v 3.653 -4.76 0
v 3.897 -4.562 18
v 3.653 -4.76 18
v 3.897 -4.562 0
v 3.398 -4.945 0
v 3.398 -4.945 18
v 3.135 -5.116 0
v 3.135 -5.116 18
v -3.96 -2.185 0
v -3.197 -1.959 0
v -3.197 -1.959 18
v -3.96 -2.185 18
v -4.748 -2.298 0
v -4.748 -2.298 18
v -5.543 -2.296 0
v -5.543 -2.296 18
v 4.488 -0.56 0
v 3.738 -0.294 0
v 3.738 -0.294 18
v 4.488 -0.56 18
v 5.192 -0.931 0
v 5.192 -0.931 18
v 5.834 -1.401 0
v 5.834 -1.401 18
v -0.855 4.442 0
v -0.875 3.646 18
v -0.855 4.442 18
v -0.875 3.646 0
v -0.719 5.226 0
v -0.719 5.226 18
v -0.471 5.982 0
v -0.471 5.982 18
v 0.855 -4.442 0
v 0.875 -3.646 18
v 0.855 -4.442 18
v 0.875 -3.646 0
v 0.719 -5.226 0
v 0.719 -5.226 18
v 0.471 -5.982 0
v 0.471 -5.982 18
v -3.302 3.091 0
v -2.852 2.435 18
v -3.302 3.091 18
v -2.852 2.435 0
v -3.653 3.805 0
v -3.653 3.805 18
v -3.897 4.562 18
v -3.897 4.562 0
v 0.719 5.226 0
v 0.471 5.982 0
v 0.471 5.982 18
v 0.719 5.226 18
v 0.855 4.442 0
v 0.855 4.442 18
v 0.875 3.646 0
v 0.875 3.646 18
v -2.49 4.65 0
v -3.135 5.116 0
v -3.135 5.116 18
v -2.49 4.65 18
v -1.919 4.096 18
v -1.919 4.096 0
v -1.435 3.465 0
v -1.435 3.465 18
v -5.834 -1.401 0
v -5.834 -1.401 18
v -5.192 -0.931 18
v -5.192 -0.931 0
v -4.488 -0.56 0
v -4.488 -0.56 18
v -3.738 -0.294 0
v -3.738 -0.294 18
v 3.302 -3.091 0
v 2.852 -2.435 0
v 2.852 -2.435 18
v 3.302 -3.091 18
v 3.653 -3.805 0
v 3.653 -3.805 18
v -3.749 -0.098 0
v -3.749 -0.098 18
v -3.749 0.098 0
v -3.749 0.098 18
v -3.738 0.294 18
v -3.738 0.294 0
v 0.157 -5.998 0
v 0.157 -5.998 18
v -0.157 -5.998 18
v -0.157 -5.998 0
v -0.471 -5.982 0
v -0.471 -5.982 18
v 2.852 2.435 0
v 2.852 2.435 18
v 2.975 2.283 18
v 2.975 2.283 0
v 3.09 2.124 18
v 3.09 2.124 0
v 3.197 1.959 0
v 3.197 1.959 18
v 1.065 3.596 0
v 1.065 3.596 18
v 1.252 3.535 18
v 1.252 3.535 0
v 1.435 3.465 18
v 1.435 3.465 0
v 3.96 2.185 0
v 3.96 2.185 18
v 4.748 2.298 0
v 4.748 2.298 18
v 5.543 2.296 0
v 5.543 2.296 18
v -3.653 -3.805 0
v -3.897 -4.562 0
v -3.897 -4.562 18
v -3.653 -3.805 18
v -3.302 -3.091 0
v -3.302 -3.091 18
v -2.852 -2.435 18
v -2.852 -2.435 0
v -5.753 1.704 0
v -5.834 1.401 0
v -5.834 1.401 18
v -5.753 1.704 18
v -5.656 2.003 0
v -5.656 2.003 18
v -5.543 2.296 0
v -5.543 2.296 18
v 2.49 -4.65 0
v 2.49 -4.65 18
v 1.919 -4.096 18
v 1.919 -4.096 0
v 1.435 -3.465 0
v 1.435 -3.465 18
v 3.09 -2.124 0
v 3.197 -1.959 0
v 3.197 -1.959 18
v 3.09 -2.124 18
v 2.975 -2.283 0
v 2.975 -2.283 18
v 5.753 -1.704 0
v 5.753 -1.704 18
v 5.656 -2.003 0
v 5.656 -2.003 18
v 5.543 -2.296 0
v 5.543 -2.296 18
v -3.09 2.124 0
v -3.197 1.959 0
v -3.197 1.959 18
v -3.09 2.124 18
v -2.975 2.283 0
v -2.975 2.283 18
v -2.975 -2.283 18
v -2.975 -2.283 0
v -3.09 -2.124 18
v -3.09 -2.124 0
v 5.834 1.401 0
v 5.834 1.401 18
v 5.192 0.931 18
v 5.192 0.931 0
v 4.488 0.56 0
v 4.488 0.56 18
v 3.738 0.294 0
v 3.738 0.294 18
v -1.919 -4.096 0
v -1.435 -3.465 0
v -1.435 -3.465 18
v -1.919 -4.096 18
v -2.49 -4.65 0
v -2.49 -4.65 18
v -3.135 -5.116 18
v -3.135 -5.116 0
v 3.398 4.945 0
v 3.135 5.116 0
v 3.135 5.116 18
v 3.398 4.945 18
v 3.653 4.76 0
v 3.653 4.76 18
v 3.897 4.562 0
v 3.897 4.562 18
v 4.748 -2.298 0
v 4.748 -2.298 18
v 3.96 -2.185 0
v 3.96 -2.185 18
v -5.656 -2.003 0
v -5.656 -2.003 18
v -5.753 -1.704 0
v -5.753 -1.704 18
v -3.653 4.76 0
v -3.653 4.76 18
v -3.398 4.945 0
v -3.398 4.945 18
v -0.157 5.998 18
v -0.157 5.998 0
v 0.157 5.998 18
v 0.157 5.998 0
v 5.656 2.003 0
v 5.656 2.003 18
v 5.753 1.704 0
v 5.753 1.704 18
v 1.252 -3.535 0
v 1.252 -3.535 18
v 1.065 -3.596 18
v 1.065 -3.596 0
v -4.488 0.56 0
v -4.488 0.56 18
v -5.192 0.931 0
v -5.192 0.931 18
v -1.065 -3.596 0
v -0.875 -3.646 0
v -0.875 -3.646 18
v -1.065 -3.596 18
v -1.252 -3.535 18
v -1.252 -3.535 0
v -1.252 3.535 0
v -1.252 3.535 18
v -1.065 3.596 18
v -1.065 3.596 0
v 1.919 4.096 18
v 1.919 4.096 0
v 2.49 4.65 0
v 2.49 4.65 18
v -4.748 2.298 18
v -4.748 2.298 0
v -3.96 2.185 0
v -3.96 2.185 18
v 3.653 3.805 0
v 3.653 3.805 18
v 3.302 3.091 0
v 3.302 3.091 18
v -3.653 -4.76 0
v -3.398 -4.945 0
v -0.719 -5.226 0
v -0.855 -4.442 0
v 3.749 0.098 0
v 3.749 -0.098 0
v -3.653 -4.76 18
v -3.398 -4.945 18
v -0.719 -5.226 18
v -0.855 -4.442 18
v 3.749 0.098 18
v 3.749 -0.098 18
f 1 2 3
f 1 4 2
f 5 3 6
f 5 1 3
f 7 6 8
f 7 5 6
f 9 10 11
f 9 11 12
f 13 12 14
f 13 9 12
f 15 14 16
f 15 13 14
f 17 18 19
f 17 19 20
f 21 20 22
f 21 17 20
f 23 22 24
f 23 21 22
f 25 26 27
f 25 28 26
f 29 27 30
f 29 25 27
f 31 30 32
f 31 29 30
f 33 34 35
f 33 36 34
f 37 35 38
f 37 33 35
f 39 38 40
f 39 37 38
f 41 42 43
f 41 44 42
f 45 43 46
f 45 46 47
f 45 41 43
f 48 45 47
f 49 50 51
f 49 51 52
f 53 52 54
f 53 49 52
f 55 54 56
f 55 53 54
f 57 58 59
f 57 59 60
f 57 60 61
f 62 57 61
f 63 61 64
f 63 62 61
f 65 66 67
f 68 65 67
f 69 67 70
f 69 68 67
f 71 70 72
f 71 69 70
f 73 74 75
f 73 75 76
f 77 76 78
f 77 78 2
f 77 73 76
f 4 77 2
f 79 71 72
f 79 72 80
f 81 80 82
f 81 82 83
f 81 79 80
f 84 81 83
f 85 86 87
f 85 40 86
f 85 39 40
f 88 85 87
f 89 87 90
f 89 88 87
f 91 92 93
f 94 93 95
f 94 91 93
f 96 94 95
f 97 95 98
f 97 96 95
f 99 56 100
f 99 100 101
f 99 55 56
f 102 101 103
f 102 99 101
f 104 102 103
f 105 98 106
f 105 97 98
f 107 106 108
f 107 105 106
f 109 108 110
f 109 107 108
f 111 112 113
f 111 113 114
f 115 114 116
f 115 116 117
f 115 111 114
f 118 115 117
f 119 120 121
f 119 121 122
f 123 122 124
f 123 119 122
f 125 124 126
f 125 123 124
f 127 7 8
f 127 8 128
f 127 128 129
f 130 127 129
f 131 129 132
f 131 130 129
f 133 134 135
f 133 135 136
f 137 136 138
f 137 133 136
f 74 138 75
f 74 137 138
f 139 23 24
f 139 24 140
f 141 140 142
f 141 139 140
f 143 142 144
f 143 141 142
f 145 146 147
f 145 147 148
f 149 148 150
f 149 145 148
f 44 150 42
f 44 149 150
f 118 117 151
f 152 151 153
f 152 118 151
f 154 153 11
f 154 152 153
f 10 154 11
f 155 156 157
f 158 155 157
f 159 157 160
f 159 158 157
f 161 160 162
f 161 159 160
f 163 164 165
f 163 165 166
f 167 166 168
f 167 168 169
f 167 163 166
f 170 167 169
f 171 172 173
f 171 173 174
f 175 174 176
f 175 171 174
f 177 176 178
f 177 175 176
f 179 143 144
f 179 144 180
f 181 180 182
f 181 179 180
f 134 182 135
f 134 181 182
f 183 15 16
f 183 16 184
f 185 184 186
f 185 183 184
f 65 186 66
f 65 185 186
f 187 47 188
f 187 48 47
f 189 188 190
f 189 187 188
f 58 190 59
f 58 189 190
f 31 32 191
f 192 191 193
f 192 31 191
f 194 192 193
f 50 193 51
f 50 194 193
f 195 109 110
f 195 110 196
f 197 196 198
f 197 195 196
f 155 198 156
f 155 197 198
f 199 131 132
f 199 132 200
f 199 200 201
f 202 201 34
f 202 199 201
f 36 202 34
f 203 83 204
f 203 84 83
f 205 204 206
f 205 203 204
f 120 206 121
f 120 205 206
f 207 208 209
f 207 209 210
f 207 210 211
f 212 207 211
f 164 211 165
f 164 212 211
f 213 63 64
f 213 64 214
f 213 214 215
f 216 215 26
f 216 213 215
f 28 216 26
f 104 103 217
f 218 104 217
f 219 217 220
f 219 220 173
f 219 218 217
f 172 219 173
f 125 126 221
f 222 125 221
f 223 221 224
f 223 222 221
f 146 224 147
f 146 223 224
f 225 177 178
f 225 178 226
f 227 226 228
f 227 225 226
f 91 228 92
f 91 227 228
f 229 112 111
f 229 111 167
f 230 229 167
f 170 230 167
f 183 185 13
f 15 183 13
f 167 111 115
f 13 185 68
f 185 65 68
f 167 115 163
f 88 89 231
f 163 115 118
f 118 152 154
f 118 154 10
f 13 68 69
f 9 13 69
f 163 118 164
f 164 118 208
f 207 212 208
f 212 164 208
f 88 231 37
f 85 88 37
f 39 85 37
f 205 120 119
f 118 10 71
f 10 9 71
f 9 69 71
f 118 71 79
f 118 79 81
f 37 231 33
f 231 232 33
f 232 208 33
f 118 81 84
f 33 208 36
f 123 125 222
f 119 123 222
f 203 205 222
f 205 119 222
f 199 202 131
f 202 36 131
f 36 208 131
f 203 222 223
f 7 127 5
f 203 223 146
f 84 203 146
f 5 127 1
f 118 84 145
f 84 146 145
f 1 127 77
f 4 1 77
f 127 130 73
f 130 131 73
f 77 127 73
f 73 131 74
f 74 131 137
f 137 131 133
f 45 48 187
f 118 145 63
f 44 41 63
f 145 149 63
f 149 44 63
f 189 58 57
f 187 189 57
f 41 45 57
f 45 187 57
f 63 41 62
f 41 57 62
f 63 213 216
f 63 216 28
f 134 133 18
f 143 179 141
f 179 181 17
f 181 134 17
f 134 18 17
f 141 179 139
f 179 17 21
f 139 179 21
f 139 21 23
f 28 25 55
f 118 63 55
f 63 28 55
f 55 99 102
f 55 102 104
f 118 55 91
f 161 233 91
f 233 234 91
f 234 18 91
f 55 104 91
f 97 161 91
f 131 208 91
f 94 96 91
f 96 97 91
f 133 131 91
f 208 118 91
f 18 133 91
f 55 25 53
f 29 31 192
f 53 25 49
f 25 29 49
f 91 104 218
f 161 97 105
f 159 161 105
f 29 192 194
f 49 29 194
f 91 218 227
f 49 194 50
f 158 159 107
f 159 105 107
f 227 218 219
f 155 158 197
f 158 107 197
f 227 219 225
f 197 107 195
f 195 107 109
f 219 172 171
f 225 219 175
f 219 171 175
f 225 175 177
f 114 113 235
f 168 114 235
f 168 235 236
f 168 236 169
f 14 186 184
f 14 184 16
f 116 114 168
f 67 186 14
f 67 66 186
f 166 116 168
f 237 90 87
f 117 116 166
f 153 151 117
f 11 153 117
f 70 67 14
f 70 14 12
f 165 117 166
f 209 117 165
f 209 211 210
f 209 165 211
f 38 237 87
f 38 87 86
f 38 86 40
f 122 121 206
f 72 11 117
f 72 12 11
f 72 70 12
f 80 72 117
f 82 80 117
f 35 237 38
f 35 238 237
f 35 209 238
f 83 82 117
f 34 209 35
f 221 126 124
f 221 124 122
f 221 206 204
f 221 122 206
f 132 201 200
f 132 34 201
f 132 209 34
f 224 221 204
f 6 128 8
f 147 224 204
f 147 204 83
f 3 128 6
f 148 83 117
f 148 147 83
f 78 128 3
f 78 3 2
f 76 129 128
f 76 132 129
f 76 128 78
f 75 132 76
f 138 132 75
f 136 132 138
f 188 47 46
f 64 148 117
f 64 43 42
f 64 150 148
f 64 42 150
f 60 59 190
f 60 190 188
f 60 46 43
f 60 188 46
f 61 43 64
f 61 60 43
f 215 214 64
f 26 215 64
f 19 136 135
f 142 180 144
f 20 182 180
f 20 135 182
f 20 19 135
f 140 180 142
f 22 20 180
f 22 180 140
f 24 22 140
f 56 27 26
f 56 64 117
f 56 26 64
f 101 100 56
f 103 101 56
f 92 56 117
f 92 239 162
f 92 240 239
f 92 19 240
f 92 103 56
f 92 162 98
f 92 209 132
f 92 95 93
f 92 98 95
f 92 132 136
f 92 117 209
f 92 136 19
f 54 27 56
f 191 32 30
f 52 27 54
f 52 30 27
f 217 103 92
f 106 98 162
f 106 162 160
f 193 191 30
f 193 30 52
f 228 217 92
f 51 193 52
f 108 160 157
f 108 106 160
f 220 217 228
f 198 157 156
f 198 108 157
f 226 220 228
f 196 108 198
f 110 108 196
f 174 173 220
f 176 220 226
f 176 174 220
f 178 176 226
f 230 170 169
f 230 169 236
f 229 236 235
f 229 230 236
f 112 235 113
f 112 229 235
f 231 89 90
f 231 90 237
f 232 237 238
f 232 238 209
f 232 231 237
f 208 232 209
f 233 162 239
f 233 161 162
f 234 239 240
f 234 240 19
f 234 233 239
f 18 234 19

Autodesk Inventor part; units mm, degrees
sketch "Sketch1" plane through (0, 0, 0) normal (0, 0, 1) x (1, 0, 0)
  circle A0 centre (0, 0) radius 6
  dimension "d0" = 12
extrude "Extrusion1" add sketch "Sketch1" along normal blind 18
ref_plane "Work Plane2" through (0, 0, 9) normal (0, 0, 1) x (1, 0, 0)
sketch "Sketch2" plane through (0, 0, 0) normal (0, 0, -1) x (-1, 0, 0)
  circle A0 centre (0, 0) radius 6 projected
  circle A1 centre (0, 0) radius 5
  dimension "d3" = 10
surface extrude "Pitch Diameter" sketch "Sketch2" against normal through all shown yes curves A1
ref_plane "Work Plane8" through (0, 0, 0) normal (0.9510565, 0.309017, 0) x (0, 0, 1)
ref_plane "Work Plane9" through (0, 0, 0) normal (1, 0, 0) x (0, 1, 0)
spur gear teeth "Spur Gear" teeth 10 pitch diameter 10 tip diameter 12 root diameter 7.5 face width 18 start plane through (0, 0, 0) normal (0, 0, -1) x (-1, 0, 0)
equation "\"d0\" = da_da"
equation "\"d1\" = da_b"
equation "\"d3\" = da_d"
equation "\"d16\" = da_aw"
equation "\"d43\" = da_aw"
equation "\"d46\" = da_aw"
equation "\"da_da\" = 12"
equation "\"da_b\" = 18"
equation "\"da_d\" = 10"
equation "\"da_aw\" = 55"
properties part number "rs390_gear" material "Steel"
